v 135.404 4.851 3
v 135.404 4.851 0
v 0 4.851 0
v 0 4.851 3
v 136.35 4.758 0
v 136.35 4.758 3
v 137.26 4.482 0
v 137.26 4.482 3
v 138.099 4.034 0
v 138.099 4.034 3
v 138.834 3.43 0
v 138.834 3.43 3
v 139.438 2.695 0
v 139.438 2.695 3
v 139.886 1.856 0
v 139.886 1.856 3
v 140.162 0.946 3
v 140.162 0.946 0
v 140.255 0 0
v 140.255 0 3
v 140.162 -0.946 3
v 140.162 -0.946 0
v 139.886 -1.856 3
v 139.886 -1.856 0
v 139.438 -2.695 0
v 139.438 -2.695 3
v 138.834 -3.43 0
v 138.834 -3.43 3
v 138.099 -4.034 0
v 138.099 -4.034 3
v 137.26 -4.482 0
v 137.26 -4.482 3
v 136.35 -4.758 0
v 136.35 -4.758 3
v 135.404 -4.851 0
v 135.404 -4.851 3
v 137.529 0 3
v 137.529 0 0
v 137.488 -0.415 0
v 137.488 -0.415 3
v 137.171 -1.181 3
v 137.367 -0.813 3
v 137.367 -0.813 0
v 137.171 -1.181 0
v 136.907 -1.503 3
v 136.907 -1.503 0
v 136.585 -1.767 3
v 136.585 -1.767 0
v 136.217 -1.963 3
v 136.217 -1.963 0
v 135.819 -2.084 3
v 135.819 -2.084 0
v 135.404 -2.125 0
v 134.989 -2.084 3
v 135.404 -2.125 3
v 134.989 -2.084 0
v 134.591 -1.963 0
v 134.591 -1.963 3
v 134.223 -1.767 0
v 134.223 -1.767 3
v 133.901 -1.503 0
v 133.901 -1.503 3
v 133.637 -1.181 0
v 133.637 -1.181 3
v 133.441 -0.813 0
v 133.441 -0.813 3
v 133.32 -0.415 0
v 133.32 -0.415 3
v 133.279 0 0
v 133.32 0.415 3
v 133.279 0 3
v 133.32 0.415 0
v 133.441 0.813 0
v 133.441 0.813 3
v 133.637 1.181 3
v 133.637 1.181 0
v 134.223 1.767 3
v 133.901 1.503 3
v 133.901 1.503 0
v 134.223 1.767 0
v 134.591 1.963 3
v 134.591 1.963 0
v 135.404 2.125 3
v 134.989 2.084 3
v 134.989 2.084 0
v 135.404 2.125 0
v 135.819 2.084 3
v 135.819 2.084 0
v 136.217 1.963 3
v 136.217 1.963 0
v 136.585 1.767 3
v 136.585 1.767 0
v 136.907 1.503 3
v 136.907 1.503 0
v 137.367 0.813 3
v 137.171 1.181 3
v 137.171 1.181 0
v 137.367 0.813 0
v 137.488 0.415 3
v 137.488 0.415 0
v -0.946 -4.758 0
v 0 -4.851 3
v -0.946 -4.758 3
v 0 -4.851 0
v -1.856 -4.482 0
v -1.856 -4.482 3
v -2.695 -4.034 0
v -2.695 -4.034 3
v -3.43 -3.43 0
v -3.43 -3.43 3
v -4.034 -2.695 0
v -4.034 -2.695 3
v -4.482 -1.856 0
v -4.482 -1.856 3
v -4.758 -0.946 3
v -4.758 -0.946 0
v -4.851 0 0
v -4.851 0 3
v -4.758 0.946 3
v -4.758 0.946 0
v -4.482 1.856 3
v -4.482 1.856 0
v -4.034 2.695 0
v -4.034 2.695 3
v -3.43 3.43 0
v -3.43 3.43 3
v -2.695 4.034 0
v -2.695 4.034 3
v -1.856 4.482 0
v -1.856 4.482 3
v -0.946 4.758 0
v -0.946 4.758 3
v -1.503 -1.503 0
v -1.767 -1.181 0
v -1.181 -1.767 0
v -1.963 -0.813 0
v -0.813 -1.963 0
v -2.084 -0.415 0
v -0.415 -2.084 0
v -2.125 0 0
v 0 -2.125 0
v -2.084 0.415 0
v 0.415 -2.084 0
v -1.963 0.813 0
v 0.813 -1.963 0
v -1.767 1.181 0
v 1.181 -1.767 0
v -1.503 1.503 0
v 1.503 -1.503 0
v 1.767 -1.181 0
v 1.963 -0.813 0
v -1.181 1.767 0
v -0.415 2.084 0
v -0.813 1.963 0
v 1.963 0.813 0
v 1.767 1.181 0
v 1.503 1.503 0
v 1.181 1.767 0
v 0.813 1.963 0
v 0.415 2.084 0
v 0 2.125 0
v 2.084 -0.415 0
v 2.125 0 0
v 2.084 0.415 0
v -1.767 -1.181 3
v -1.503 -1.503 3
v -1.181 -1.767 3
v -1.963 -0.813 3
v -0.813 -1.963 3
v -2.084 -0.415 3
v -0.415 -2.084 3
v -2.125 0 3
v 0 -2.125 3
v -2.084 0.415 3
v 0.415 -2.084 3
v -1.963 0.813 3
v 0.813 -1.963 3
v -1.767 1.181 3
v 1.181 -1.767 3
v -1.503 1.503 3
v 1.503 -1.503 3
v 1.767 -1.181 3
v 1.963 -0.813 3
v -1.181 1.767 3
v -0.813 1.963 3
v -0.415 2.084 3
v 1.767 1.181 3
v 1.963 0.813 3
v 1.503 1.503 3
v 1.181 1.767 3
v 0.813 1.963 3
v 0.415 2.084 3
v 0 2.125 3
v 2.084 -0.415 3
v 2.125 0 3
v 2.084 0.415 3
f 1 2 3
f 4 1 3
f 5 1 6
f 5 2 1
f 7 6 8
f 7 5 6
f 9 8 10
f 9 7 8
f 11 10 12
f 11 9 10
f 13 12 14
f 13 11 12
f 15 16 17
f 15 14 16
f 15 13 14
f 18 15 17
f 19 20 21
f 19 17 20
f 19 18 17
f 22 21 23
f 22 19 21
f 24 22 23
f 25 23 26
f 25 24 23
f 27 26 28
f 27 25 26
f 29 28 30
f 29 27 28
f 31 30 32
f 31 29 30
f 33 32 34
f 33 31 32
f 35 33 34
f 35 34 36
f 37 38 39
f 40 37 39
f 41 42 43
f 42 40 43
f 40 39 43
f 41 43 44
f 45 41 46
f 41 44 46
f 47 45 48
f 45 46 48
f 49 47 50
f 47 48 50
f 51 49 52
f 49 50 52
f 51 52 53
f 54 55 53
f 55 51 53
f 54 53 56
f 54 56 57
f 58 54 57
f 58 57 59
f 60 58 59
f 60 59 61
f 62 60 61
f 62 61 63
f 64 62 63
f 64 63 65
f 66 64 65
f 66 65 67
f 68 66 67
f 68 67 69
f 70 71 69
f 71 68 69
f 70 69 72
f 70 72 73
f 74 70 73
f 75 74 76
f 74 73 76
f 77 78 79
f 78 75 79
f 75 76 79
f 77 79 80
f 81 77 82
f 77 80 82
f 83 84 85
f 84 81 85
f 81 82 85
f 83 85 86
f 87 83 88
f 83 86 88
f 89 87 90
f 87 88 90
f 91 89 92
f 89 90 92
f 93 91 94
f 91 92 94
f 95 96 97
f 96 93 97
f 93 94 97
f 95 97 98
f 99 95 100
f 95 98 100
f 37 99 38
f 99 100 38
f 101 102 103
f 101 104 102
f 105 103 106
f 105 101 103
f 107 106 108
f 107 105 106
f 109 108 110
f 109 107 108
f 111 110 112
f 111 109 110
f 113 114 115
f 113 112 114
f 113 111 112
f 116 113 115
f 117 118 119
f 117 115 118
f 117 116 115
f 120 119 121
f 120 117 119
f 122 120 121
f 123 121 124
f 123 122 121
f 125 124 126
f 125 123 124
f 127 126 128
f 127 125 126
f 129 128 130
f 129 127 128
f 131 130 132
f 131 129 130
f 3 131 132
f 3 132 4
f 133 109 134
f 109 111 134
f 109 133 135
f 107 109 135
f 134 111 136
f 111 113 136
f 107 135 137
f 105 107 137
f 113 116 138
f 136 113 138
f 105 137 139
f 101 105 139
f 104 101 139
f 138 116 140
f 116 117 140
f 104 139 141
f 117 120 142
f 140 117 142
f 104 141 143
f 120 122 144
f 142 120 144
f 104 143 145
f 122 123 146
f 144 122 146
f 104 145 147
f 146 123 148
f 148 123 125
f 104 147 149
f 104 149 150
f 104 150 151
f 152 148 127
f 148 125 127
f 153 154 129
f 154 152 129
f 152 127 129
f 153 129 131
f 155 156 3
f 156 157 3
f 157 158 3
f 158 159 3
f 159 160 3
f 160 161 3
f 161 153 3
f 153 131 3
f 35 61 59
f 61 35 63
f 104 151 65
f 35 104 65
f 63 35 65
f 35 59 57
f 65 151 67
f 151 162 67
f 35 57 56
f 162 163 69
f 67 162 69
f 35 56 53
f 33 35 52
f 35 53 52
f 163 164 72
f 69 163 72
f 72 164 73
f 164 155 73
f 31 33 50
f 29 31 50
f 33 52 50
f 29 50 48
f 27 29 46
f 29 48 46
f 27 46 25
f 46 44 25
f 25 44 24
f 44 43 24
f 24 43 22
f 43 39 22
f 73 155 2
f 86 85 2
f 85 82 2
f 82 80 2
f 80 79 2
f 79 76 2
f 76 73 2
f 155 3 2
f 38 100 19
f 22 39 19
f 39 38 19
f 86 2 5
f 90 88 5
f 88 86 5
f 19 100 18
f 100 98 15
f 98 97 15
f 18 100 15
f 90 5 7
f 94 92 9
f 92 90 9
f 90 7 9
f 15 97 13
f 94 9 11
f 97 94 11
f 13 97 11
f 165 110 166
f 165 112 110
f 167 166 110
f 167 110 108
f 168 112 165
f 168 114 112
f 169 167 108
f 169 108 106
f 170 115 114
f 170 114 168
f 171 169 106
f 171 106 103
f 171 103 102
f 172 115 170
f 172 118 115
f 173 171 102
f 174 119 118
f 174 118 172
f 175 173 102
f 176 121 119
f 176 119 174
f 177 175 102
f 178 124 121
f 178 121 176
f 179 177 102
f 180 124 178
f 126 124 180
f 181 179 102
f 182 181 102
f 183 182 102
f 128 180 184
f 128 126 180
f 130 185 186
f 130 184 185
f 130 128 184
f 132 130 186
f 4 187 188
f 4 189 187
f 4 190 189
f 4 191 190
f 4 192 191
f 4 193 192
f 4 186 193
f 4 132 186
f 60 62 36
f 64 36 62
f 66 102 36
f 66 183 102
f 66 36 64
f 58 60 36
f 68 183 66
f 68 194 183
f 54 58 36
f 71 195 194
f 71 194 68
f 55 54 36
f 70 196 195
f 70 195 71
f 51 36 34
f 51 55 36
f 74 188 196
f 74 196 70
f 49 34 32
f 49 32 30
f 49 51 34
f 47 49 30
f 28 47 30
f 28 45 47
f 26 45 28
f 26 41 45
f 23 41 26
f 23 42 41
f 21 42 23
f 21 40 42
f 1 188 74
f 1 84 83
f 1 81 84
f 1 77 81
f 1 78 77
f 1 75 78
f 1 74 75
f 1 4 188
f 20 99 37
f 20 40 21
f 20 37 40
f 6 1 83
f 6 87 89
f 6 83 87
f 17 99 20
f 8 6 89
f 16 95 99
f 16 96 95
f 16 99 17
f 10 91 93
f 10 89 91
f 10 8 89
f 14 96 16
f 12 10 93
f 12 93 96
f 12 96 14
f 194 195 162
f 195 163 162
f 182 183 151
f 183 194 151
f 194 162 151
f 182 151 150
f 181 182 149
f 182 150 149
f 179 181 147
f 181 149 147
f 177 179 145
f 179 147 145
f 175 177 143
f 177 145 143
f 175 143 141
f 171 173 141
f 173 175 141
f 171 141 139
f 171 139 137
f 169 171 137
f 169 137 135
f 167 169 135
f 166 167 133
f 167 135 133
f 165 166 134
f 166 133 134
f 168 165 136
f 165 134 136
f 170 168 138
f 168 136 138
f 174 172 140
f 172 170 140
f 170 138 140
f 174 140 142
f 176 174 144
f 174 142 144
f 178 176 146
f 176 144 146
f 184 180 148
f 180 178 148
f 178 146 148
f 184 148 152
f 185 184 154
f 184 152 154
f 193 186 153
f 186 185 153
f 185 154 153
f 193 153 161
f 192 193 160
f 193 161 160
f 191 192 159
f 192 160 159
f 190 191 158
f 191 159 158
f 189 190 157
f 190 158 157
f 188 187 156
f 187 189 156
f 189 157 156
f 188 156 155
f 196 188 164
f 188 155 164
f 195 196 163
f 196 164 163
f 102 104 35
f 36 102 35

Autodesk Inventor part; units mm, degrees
ref_plane "YZ Plane" through (0, 0, 0) normal (1, 0, 0) x (0, 1, 0)
ref_plane "XZ Plane" through (0, 0, 0) normal (0, 1, 0) x (-1, 0, 0)
ref_plane "XY Plane" through (0, 0, 0) normal (0, 0, 1) x (1, 0, 0)
sketch "Sketch1" plane through (0, 0, 0) normal (0, 0, 1) x (1, 0, 0)
  line L0 (0, 0) -> (135.404, 0) construction
  line L1 (0, -4.8511) -> (135.404, -4.8511)
  line L2 (135.404, 4.8511) -> (0, 4.8511)
  arc A0 (0, 4.8511) -> (0, -4.8511) centre (0, 0) ccw
  arc A1 (135.404, -4.8511) -> (135.404, 4.8511) centre (135.404, 0) ccw
  circle A2 centre (0, 0) radius 2.125
  circle A3 centre (135.404, 0) radius 2.125
  point P0 (67.702, 0)
  point P1 (0.702, -2.0057)
  point P2 (0.702, 2.0057)
  dimension "d0" = 135.404
  dimension "d1" = 4.25
extrude "Extrusion1" add sketch "Sketch1" along normal blind 3
properties part number "linkage"
